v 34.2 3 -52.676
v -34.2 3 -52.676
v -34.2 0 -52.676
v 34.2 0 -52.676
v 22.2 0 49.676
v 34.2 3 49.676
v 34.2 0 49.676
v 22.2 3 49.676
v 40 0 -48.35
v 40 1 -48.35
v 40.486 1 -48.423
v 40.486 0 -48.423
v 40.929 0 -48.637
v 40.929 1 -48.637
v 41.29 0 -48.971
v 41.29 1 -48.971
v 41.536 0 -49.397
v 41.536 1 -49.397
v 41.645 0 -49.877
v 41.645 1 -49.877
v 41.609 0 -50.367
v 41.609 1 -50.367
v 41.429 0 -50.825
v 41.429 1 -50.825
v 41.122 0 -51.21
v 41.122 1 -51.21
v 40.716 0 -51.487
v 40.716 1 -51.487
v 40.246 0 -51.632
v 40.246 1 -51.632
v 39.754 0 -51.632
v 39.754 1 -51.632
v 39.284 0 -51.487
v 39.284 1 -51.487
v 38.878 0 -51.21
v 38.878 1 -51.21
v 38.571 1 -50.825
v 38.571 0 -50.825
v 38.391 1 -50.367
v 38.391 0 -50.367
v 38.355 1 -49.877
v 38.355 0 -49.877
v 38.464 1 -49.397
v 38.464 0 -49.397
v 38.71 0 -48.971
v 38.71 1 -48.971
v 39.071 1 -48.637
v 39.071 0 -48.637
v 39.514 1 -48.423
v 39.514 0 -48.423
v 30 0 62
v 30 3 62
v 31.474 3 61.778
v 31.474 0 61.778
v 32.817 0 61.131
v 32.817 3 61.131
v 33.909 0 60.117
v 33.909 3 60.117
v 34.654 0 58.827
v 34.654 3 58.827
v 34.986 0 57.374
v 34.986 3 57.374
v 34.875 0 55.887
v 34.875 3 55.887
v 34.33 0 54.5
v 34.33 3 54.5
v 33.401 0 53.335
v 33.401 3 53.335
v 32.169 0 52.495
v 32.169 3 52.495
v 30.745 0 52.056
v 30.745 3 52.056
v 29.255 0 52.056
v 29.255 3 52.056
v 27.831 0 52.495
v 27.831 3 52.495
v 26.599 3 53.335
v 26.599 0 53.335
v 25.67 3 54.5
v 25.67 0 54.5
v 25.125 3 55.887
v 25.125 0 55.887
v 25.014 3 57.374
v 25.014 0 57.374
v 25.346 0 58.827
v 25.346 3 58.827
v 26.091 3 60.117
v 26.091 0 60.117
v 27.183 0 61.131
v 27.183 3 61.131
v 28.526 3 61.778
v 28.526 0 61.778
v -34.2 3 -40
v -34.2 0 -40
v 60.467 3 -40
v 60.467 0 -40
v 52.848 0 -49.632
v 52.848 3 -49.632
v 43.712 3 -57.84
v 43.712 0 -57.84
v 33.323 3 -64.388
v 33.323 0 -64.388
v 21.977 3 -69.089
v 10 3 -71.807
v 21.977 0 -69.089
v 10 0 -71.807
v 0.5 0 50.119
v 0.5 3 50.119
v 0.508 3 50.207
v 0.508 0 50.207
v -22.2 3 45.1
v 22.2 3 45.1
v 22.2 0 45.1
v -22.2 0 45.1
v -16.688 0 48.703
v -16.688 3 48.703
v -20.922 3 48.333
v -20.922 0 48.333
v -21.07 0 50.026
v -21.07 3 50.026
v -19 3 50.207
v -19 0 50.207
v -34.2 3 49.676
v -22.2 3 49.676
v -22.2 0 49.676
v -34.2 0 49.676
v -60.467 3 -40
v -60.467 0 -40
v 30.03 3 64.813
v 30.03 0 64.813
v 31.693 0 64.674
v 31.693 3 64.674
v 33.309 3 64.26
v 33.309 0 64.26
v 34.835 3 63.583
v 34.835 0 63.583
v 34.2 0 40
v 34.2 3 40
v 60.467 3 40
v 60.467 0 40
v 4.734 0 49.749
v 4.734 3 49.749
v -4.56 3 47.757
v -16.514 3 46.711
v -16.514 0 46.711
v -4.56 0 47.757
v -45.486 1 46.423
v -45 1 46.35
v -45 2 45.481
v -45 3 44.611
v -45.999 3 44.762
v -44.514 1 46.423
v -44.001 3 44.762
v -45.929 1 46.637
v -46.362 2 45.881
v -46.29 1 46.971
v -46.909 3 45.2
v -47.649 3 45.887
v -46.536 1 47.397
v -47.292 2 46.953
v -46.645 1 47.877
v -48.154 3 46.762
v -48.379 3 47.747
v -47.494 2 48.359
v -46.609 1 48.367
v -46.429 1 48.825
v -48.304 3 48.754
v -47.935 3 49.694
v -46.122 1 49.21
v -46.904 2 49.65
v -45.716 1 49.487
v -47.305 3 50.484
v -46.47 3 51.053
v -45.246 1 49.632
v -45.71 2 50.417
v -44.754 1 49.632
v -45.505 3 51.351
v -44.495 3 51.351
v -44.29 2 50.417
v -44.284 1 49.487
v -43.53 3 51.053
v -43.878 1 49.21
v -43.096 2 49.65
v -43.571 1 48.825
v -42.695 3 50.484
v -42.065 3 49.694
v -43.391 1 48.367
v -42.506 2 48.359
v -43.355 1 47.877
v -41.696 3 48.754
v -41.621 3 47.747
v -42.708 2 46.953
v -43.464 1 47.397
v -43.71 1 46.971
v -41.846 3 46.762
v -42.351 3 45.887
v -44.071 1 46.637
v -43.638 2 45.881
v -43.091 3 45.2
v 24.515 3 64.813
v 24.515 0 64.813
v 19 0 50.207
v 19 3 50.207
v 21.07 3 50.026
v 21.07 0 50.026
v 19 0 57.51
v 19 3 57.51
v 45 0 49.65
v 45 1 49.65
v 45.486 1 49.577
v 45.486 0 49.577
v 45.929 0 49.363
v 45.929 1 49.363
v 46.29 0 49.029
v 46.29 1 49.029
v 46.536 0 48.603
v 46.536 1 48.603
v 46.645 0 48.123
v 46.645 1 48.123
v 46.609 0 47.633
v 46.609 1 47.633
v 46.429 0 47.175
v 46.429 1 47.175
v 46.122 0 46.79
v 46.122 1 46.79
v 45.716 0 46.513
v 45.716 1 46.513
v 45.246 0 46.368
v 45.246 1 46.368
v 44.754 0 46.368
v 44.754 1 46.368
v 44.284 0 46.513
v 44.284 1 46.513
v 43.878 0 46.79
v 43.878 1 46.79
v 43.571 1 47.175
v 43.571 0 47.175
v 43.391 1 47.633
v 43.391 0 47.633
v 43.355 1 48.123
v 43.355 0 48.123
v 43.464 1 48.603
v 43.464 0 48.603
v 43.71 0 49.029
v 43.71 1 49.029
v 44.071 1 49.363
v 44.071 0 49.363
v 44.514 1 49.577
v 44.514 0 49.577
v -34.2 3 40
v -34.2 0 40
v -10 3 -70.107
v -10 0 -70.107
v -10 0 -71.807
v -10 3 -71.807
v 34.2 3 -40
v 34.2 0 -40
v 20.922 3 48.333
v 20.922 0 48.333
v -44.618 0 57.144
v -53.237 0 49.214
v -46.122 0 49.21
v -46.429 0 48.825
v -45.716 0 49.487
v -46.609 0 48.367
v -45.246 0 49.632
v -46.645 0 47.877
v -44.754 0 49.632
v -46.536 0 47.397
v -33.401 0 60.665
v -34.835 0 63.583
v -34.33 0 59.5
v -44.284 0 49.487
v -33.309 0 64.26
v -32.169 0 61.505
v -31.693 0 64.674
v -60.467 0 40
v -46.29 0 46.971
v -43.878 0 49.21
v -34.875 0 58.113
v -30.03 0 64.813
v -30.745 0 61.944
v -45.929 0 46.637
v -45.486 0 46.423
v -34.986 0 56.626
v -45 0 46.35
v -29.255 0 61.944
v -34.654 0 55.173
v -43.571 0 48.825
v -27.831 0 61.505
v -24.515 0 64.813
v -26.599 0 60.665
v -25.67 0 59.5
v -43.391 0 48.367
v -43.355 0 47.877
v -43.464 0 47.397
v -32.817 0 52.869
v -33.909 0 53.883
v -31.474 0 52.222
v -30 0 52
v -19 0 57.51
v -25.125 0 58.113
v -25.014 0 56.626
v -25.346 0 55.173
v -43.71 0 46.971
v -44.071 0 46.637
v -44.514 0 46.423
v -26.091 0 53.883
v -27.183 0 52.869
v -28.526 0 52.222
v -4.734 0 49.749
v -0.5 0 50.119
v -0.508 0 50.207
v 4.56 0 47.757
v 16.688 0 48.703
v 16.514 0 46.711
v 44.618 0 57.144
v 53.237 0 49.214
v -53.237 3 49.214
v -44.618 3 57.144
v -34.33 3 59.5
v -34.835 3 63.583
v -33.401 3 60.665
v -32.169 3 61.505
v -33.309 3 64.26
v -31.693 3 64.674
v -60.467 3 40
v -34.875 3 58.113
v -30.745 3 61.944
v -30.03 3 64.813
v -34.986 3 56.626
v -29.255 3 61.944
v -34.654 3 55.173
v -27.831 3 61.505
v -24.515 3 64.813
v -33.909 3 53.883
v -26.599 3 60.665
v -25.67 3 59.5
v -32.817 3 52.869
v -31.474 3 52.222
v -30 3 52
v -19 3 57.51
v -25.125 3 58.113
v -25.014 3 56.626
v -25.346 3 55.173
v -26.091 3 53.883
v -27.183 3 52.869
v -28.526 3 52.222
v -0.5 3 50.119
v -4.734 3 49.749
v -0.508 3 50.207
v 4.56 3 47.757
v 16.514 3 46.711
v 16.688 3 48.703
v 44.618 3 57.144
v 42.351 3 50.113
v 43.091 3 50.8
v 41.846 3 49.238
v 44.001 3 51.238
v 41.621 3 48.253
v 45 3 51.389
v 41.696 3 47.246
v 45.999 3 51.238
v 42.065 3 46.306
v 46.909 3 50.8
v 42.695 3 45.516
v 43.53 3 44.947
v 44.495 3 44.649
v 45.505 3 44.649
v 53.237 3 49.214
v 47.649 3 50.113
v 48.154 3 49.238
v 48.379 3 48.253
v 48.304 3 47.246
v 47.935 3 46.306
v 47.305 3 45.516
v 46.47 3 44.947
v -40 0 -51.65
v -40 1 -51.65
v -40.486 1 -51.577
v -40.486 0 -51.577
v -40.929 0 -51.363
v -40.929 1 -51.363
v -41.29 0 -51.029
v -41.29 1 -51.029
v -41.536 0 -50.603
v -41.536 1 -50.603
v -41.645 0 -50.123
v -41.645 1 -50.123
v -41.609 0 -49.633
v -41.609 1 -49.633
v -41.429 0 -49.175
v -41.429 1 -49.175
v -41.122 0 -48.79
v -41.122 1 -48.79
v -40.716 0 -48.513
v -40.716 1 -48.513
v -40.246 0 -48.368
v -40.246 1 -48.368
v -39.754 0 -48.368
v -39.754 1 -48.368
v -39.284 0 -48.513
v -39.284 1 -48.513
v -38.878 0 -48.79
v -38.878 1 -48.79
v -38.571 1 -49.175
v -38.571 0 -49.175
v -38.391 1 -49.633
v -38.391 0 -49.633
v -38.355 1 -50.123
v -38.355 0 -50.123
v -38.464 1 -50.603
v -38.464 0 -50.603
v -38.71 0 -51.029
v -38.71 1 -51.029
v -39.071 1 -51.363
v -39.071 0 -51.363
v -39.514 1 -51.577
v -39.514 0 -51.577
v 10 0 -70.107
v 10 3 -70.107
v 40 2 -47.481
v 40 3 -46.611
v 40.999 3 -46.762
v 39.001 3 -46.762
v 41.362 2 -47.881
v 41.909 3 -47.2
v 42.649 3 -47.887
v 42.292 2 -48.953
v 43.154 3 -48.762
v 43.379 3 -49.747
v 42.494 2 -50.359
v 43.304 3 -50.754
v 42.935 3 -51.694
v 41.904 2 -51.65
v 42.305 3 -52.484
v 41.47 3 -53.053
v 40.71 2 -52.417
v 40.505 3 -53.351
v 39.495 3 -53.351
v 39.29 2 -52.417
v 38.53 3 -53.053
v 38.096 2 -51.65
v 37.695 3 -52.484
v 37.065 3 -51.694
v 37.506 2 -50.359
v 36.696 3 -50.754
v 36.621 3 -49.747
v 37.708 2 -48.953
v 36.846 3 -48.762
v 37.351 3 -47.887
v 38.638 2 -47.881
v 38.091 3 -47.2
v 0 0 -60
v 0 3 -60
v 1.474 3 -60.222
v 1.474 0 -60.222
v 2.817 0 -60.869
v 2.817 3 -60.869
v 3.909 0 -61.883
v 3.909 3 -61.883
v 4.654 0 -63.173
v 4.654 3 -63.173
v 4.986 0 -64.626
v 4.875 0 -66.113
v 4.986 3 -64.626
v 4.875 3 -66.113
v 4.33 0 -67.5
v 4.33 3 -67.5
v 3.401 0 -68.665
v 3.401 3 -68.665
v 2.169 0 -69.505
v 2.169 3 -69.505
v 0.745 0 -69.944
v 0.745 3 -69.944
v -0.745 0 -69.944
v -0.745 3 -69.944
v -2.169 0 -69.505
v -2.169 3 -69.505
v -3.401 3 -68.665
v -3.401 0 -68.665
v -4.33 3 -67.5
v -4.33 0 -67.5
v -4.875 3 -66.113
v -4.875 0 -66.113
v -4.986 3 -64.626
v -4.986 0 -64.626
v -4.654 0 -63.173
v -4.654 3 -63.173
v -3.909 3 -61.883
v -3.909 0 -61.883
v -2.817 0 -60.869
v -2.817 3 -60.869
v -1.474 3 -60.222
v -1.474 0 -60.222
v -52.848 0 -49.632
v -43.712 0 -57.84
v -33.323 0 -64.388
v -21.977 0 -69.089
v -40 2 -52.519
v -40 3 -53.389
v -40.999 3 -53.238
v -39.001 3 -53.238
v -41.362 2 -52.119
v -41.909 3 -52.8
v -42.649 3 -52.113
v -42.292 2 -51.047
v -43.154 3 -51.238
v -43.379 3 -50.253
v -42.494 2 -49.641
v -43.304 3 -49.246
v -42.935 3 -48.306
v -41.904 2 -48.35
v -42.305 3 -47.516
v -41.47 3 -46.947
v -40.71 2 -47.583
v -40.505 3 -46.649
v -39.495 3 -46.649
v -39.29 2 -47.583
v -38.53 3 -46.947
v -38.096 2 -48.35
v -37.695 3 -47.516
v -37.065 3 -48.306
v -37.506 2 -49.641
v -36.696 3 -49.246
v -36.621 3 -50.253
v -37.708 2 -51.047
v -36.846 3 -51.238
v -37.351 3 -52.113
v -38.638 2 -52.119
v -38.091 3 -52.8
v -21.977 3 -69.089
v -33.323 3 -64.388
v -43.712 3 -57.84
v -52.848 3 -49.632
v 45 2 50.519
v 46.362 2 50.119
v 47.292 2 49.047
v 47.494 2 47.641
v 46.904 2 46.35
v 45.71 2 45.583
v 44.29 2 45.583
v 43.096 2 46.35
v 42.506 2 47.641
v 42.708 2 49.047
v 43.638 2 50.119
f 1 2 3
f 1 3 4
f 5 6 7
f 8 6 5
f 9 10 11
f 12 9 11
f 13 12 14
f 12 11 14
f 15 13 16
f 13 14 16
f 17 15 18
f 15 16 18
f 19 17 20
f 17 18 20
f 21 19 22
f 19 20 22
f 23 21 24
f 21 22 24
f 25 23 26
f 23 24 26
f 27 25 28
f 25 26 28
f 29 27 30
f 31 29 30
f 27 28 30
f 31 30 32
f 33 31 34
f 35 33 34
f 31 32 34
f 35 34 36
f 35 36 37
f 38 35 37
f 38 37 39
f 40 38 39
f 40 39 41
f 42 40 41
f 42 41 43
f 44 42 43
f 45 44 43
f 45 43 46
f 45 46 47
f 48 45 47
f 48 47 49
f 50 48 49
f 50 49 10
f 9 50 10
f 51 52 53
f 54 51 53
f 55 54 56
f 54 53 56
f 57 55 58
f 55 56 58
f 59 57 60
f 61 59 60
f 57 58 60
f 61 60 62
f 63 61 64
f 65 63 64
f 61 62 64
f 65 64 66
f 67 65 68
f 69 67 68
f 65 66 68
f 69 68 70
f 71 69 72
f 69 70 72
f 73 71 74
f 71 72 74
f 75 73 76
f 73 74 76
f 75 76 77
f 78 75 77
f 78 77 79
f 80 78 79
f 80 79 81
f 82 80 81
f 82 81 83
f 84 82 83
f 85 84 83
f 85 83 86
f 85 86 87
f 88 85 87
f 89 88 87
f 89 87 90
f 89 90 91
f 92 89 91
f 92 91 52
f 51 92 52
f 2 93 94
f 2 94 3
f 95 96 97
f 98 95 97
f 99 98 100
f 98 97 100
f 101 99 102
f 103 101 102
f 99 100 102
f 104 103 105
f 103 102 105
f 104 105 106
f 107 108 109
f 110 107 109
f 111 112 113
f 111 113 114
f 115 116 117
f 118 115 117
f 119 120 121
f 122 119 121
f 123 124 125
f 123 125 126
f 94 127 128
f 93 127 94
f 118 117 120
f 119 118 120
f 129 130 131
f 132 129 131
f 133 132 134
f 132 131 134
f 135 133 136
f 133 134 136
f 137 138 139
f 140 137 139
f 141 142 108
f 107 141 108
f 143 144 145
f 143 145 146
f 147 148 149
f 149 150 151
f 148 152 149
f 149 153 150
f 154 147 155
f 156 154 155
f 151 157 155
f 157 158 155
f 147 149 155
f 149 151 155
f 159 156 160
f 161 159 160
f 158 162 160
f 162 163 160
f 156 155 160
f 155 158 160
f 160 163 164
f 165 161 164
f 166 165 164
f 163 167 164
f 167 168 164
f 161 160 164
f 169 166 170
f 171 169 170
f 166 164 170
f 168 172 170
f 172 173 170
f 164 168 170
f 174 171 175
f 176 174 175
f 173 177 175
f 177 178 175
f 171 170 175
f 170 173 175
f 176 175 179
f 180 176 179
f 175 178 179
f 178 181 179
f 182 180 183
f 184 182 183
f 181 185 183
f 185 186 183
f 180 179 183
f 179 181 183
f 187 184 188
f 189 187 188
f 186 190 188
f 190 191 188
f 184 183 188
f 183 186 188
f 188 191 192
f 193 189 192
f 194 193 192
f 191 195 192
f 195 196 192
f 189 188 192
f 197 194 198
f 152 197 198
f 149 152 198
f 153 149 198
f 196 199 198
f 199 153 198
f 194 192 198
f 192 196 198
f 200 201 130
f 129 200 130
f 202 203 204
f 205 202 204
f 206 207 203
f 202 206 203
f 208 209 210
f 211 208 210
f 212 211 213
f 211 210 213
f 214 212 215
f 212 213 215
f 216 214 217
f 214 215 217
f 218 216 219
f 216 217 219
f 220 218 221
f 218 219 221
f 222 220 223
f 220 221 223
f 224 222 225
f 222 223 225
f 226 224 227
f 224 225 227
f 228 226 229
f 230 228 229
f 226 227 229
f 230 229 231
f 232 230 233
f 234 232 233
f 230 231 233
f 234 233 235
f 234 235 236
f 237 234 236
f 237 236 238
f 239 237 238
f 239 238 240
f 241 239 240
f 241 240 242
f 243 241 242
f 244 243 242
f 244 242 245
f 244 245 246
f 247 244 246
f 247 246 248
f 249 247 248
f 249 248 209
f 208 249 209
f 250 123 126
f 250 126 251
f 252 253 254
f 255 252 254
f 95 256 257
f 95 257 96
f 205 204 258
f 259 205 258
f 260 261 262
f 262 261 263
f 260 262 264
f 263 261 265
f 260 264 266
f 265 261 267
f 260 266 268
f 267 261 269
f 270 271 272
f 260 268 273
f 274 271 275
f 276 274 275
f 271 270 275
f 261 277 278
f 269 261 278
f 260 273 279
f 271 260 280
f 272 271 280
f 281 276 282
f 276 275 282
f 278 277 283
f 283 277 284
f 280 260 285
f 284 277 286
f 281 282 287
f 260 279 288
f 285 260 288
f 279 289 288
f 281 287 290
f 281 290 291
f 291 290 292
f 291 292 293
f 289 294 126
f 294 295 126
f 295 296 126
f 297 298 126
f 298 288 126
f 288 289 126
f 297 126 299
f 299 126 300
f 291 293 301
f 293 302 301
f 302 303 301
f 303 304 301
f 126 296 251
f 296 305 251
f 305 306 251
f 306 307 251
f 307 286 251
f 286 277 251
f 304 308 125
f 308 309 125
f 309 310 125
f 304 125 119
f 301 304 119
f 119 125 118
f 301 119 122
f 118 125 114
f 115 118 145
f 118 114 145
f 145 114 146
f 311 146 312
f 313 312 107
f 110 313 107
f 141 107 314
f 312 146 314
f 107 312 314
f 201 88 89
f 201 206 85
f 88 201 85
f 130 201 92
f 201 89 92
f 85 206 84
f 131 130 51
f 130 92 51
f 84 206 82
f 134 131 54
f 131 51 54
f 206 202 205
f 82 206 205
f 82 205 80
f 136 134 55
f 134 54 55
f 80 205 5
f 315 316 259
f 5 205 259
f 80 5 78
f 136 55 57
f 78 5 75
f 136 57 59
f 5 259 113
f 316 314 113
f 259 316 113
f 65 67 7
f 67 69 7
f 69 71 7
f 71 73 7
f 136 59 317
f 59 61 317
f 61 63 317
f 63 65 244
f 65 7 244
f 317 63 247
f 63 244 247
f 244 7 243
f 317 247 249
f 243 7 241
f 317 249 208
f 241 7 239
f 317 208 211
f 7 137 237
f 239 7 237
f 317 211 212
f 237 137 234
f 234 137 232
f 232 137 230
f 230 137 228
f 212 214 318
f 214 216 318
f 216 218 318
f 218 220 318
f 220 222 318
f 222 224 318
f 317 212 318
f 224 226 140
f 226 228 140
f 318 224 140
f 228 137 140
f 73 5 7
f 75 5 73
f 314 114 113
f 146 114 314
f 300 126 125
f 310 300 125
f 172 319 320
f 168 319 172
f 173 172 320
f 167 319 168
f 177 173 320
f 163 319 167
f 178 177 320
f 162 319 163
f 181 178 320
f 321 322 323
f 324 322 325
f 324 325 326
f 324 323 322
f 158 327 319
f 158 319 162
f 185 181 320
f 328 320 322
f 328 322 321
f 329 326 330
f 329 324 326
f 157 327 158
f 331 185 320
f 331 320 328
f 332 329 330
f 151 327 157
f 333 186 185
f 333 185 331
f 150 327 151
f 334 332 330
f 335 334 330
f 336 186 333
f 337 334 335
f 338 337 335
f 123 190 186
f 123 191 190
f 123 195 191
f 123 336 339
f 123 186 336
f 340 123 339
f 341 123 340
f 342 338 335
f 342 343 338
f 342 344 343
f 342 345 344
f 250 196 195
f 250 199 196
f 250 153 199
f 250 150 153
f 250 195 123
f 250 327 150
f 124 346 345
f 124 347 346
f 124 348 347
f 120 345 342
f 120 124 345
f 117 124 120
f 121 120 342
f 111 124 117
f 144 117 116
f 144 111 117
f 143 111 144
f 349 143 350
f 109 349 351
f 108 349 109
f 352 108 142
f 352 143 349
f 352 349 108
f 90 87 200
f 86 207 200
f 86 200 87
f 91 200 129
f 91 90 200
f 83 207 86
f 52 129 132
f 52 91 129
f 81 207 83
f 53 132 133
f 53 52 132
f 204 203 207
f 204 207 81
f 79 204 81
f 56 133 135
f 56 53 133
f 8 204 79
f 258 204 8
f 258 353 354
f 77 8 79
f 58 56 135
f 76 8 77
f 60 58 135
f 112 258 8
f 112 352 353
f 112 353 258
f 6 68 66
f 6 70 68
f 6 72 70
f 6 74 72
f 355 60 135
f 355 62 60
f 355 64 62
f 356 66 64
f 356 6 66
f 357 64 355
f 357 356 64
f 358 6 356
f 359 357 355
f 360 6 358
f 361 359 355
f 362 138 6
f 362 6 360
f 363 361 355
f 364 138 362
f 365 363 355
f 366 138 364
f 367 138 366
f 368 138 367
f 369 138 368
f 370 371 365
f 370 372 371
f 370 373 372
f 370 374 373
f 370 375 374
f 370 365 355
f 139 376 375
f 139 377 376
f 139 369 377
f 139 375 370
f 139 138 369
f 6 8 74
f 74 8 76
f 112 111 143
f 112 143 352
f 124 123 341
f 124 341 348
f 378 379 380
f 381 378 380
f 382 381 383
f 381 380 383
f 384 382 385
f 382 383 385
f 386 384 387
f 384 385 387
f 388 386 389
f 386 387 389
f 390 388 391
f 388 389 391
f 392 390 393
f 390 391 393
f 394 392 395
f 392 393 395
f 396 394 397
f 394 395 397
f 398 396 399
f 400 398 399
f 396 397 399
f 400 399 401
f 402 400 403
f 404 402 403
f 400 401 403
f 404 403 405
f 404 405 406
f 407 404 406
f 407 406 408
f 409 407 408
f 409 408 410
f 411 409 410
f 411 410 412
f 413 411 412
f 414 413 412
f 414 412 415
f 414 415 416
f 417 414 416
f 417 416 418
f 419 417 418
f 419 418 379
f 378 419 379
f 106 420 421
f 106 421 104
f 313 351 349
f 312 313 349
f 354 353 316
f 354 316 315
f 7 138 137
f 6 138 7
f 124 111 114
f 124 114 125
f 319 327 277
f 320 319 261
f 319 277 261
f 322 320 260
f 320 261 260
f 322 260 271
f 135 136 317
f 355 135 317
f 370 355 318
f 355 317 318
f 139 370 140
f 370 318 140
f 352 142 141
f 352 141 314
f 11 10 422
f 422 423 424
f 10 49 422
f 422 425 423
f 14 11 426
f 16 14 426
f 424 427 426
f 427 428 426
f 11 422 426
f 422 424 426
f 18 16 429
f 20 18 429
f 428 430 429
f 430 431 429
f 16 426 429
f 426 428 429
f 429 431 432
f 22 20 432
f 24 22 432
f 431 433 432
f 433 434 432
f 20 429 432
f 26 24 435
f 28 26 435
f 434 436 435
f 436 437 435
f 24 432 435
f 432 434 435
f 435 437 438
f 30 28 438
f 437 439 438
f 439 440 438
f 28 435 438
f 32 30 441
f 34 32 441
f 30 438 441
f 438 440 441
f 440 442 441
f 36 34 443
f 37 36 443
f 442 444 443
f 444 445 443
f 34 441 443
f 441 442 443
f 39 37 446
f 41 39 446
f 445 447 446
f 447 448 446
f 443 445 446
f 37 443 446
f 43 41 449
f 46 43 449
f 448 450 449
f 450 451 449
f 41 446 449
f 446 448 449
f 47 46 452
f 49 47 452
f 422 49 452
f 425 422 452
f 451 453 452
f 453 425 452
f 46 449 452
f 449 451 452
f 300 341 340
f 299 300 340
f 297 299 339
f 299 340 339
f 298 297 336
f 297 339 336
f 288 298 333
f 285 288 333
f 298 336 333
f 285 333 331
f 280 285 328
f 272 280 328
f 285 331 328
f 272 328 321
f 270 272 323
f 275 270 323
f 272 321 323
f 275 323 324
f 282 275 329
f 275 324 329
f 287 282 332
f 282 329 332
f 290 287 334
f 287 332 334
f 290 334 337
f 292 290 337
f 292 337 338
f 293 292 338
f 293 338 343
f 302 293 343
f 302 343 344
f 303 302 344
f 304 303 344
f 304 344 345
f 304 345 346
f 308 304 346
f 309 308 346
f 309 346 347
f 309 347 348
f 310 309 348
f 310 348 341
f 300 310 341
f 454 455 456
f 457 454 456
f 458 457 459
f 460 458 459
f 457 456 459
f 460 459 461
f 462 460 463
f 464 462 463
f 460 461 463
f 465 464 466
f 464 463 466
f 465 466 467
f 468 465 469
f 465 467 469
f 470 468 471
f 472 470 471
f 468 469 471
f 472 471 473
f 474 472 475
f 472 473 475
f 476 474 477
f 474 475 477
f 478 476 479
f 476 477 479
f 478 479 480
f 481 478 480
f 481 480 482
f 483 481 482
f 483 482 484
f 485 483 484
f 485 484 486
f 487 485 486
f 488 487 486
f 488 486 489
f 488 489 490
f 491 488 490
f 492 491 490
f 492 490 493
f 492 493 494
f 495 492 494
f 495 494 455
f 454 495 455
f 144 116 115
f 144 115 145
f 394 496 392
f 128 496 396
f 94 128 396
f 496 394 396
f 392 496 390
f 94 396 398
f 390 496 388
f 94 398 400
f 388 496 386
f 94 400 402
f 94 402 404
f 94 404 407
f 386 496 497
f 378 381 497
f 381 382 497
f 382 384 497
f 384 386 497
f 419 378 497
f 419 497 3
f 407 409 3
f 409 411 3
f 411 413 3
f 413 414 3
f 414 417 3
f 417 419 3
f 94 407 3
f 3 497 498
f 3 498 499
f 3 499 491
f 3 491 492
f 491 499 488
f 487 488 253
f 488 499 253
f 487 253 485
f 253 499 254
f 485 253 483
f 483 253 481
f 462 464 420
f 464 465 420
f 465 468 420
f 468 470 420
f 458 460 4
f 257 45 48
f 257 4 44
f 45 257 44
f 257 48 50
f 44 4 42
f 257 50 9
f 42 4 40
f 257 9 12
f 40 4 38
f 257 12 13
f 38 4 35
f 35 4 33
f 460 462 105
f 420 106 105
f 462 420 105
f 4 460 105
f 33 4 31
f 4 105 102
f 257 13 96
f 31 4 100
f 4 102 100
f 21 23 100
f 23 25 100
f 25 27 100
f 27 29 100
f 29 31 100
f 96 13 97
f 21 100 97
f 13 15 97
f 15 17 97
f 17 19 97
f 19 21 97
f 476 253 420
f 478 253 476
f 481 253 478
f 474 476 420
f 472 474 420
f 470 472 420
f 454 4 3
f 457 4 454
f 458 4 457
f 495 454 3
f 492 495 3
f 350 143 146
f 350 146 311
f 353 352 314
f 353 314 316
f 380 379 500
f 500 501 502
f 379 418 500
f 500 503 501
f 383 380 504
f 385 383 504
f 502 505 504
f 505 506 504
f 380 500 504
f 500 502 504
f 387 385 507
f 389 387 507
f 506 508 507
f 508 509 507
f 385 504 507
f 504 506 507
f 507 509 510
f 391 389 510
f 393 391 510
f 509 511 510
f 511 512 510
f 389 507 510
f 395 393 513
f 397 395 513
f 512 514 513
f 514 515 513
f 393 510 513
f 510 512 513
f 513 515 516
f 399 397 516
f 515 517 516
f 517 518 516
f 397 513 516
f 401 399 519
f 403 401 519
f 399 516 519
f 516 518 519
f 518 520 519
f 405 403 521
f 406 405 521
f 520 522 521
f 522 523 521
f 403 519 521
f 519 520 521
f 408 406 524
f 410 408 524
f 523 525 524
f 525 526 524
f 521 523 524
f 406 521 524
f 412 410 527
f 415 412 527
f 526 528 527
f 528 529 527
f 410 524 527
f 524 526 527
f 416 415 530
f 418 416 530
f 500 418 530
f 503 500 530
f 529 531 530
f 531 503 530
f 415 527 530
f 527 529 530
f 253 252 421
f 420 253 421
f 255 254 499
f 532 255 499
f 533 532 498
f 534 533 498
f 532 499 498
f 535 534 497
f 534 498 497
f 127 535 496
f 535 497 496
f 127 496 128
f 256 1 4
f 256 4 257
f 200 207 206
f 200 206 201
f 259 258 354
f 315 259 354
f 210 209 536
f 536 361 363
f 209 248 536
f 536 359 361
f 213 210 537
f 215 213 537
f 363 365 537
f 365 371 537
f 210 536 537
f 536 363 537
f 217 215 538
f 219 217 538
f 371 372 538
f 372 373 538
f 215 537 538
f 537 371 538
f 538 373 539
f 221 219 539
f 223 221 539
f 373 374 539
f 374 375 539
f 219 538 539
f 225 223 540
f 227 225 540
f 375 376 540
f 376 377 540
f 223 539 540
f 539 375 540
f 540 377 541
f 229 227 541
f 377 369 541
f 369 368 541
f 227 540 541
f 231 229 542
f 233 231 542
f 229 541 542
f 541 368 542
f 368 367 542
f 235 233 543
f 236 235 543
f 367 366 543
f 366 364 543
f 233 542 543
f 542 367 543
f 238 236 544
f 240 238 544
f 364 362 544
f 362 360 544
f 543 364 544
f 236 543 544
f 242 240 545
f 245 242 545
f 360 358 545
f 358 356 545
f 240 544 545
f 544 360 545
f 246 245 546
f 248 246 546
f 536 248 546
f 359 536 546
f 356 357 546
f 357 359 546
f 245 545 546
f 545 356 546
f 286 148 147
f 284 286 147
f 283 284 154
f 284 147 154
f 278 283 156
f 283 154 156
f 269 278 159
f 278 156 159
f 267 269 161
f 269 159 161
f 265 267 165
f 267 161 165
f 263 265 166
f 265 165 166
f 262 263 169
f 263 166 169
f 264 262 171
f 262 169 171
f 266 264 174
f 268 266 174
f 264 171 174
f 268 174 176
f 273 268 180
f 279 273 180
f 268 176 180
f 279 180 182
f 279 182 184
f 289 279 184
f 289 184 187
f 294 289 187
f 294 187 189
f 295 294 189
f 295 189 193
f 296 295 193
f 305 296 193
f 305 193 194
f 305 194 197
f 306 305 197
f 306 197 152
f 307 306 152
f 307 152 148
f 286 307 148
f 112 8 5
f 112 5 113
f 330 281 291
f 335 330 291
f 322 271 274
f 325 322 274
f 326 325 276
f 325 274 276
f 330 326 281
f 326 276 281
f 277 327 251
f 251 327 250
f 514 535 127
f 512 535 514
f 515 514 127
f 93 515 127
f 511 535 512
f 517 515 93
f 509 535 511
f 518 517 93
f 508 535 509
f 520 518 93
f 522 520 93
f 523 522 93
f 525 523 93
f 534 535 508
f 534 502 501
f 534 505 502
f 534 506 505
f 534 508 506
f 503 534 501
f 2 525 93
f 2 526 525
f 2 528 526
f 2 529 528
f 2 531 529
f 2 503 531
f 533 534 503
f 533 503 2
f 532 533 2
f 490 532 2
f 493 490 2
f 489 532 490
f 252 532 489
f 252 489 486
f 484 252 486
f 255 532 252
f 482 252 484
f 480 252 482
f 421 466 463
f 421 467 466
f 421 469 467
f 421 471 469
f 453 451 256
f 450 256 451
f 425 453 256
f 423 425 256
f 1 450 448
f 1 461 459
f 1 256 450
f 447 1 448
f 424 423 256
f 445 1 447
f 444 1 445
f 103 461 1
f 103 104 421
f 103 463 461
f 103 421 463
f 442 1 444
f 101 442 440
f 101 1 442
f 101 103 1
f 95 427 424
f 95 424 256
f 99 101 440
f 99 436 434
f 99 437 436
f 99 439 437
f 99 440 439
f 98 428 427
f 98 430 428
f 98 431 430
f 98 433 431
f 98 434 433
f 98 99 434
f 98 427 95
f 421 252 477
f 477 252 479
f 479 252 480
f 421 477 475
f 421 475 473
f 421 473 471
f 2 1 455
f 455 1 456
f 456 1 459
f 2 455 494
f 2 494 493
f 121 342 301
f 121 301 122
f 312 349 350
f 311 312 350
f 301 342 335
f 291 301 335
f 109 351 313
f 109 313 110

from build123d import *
from OCP.BRepFilletAPI import BRepFilletAPI_MakeChamfer

# Parameters (mm, degrees)
BOSS_EXTRUDE1_DEPTH = 3
CUT_EXTRUDE1_DEPTH  = 103.574363269
SKETCH3_W           = 38.3
SKETCH3_H           = 80
CUT_EXTRUDE2_DEPTH  = 103.574363269
CUT_EXTRUDE3_DEPTH  = 95.453692358
SKETCH5_W           = 38
SKETCH5_H           = 14.605577538
CUT_EXTRUDE4_DEPTH  = 95.453692358
SKETCH6_W           = 68.4
SKETCH6_H           = 3
CUT_EXTRUDE5_DEPTH  = 95.453692358
SKETCH7_R           = 5
CUT_EXTRUDE6_DEPTH  = 95.453692358
SKETCH11_R          = 5
CUT_EXTRUDE10_DEPTH = 95.453692358
CUT_EXTRUDE11_DEPTH = 95.453692358
SKETCH14_R          = 1.65
CUT_EXTRUDE12_DEPTH = 95.453692358
SKETCH15_W          = 20
SKETCH15_H          = 1.7
CUT_EXTRUDE13_DEPTH = 10
CHAMFER1_SIZE       = 2
CHAMFER1_SIZE2      = 1.738573476
CHAMFER2_SIZE       = 2
CHAMFER2_SIZE2      = 1.738573476


with BuildPart() as part:
    # Sketch1 → Boss-Extrude1 (new body)
    with BuildSketch(Plane(origin=(0, 0, 0), x_dir=(1, 0, 0), z_dir=(0, 1, 0))):
        with BuildLine():
            Line((-30.029977361, -64.812867647), (30.029977361, -64.812867647))
            ThreePointArc((30.029977361, -64.812867647), (32.509837414, -64.500503794), (34.834773739, -63.582926471))
            ThreePointArc((34.834773739, -63.582926471), (0, 72.5), (-34.834773739, -63.582926471))
            ThreePointArc((-34.834773739, -63.582926471), (-32.509837414, -64.500503794), (-30.029977361, -64.812867647))
        make_face()
    extrude(amount=BOSS_EXTRUDE1_DEPTH)

    # Sketch2 → Cut-Extrude1 (cut, through all)
    with BuildSketch(Plane(origin=(0, 3, 0), x_dir=(1, 0, 0), z_dir=(0, 1, 0))):
        Polygon((22.2, -49.675685802), (22.2, -45.1), (-22.2, -45.1), (-22.2, -49.675685802), (-34.2, -49.675685802), (-34.2, 49.675685802), (-22.2, 49.675685802), (-22.2, 45.5), (22.2, 45.5), (22.2, 49.675685802), (34.2, 49.675685802), (34.2, -49.675685802), align=None)
    extrude(amount=-CUT_EXTRUDE1_DEPTH, mode=Mode.SUBTRACT)

    # Sketch3 → Cut-Extrude2 (cut, through all)
    with BuildSketch(Plane(origin=(0, 3, 0), x_dir=(1, 0, 0), z_dir=(0, 1, 0))):
        with Locations((-53.35, 0)):
            Rectangle(SKETCH3_W, SKETCH3_H)
        with Locations((53.35, 0)):
            Rectangle(SKETCH3_W, SKETCH3_H)
    extrude(amount=-CUT_EXTRUDE2_DEPTH, mode=Mode.SUBTRACT)


with BuildPart() as cut_extrude2_piece_1:
    # of the separate pieces the step leaves, piece 1, a body of its own (cut_extrude2_pieces)
    add(part.part.solids().sort_by_distance((60.466933112, 0, -40))[0])

    # Sketch6 → Cut-Extrude5 (cut, through all)
    with BuildSketch(Plane(origin=(0, 3, 0), x_dir=(1, 0, 0), z_dir=(0, 1, 0))):
        with Locations((0, 51.175685802)):
            Rectangle(SKETCH6_W, SKETCH6_H)
    extrude(amount=-CUT_EXTRUDE5_DEPTH, mode=Mode.SUBTRACT)


with BuildPart() as cut_extrude2_piece_2:
    # of the separate pieces the step leaves, piece 2, a body of its own (cut_extrude2_pieces)
    add(part.part.solids().sort_by_distance((-34.834773739, 0, 63.582926471))[0])

    # Sketch4 → Cut-Extrude3 (cut, through all)
    with BuildSketch(Plane(origin=(0, 3, 0), x_dir=(1, 0, 0), z_dir=(0, 1, 0))):
        Polygon((-21.070156074, -50.026174921), (-0.648164763, -51.812867647), (-0.5, -50.11933666), (-20.921991311, -48.332643934), align=None)
        Polygon((21.070156074, -50.026174921), (20.921991311, -48.332643934), (0.5, -50.11933666), (0.648164763, -51.812867647), align=None)
    extrude(amount=-CUT_EXTRUDE3_DEPTH, mode=Mode.SUBTRACT)

    # Sketch5 → Cut-Extrude4 (cut, through all)
    with BuildSketch(Plane(origin=(0, 3, 0), x_dir=(1, 0, 0), z_dir=(0, 1, 0))):
        with Locations((0, -57.510078878)):
            Rectangle(SKETCH5_W, SKETCH5_H)
        Polygon((16.688163844, -48.703055841), (4.733827467, -49.748924754), (4.559515981, -47.756535357), (16.513852358, -46.710666444), align=None)
        Polygon((-16.513852358, -46.710666444), (-4.559515981, -47.756535357), (-4.733827467, -49.748924754), (-16.688163844, -48.703055841), align=None)
    extrude(amount=-CUT_EXTRUDE4_DEPTH, mode=Mode.SUBTRACT)

    # Sketch7 → Cut-Extrude6 (cut, through all)
    with BuildSketch(Plane(origin=(0, 3, 0), x_dir=(1, 0, 0), z_dir=(0, 1, 0))):
        with Locations(Location((-30, -57, 0), (0, 0, 90))):
            Circle(SKETCH7_R)
        with Locations(Location((30, -57, 0), (0, 0, 270))):
            Circle(SKETCH7_R)
    extrude(amount=-CUT_EXTRUDE6_DEPTH, mode=Mode.SUBTRACT)

    # Sketch13 → Cut-Extrude11 (cut, through all)
    with BuildSketch(Plane(origin=(0, 3, 0), x_dir=(1, 0, 0), z_dir=(0, 1, 0))):
        Polygon((19, -57.510078878), (24.514988681, -64.812867647), (19, -64.812867647), align=None)
        Polygon((-19, -64.812867647), (-19, -57.510078878), (-24.514988681, -64.812867647), align=None)
    extrude(amount=-CUT_EXTRUDE11_DEPTH, mode=Mode.SUBTRACT)


with BuildPart() as cut_extrude5_kept_piece:
    # of the separate pieces the step leaves, the one the design keeps (cut_extrude5_pieces_kept)
    add(cut_extrude2_piece_1.part.solids().sort_by_distance((60.466933112, 0, -40))[0])

    # Sketch11 → Cut-Extrude10 (cut, through all)
    with BuildSketch(Plane(origin=(0, 3, 0), x_dir=(1, 0, 0), z_dir=(0, 1, 0))):
        with Locations(Location((0, 65, 0), (0, 0, 270))):
            Circle(SKETCH11_R)
    extrude(amount=-CUT_EXTRUDE10_DEPTH, mode=Mode.SUBTRACT)


with BuildPart() as cut_extrude12_tool:
    # Sketch14 → Cut-Extrude12 (new, through all)
    with BuildSketch(Plane(origin=(0, 3, 0), x_dir=(1, 0, 0), z_dir=(0, 1, 0))):
        with Locations(Location((45, -48, 0), (0, 0, 270))):
            Circle(SKETCH14_R)
        with Locations(Location((-45, -48, 0), (0, 0, 90))):
            Circle(SKETCH14_R)
        with Locations(Location((40, 50, 0), (0, 0, 270))):
            Circle(SKETCH14_R)
        with Locations(Location((-40, 50, 0), (0, 0, 90))):
            Circle(SKETCH14_R)
    extrude(amount=-CUT_EXTRUDE12_DEPTH)


with BuildPart() as cut_extrude2_piece_2_1:
    add(cut_extrude2_piece_2.part)

    # Cut-Extrude12: cut by cut_extrude12_tool
    add(cut_extrude12_tool.part, mode=Mode.SUBTRACT)

    # Chamfer1: one chamfer whose edges measure the first distance from different faces: ONE call of the kernel's chamfer builder (chamfer() names one face for all edges)
    chamfer1_edges_1 = [cut_extrude2_piece_2_1.edges().sort_by_distance(p)[0] for p in [
        (45, 3, 46.35),
    ]]
    chamfer1_side_1 = [cut_extrude2_piece_2_1.faces().sort_by_distance(p)[0] for p in [
        (45, 1.5, 46.35),
    ]]
    chamfer1_edges_2 = [cut_extrude2_piece_2_1.edges().sort_by_distance(p)[0] for p in [
        (-45, 3, 49.65),
    ]]
    chamfer1_side_2 = [cut_extrude2_piece_2_1.faces().sort_by_distance(p)[0] for p in [
        (-45, 1.5, 49.65),
    ]]
    chamfer1 = BRepFilletAPI_MakeChamfer(cut_extrude2_piece_2_1.part.solid().wrapped)
    for e in chamfer1_edges_1:
        chamfer1.Add(CHAMFER1_SIZE, CHAMFER1_SIZE2, e.wrapped, chamfer1_side_1[0].wrapped)  # the first distance lies on this face
    for e in chamfer1_edges_2:
        chamfer1.Add(CHAMFER1_SIZE, CHAMFER1_SIZE2, e.wrapped, chamfer1_side_2[0].wrapped)  # the first distance lies on this face
    add(Compound.cast(chamfer1.Shape()), mode=Mode.REPLACE)


with BuildPart() as cut_extrude5_kept_piece_1:
    add(cut_extrude5_kept_piece.part)

    # Cut-Extrude12: cut by cut_extrude12_tool
    add(cut_extrude12_tool.part, mode=Mode.SUBTRACT)

    # Sketch15 → Cut-Extrude13 (cut)
    with BuildSketch(Plane(origin=(0, 3, 0), x_dir=(1, 0, 0), z_dir=(0, 1, 0))):
        with Locations((0, 70.957033082)):
            Rectangle(SKETCH15_W, SKETCH15_H)
    extrude(amount=-CUT_EXTRUDE13_DEPTH, mode=Mode.SUBTRACT)


with BuildPart() as body_3:
    # of the pieces the cut leaves, the one that is kept (cut_extrude13_keep)
    add(cut_extrude5_kept_piece_1.part.solids().sort_by_distance((60.466933112, 0, -40))[0])

    # Chamfer2: one chamfer whose edges measure the first distance from different faces: ONE call of the kernel's chamfer builder (chamfer() names one face for all edges)
    chamfer2_edges_1 = [body_3.edges().sort_by_distance(p)[0] for p in [
        (-40, 3, -48.35),
    ]]
    chamfer2_side_1 = [body_3.faces().sort_by_distance(p)[0] for p in [
        (-40, 1.5, -48.35),
    ]]
    chamfer2_edges_2 = [body_3.edges().sort_by_distance(p)[0] for p in [
        (40, 3, -51.65),
    ]]
    chamfer2_side_2 = [body_3.faces().sort_by_distance(p)[0] for p in [
        (40, 1.5, -51.65),
    ]]
    chamfer2 = BRepFilletAPI_MakeChamfer(body_3.part.solid().wrapped)
    for e in chamfer2_edges_1:
        chamfer2.Add(CHAMFER2_SIZE, CHAMFER2_SIZE2, e.wrapped, chamfer2_side_1[0].wrapped)  # the first distance lies on this face
    for e in chamfer2_edges_2:
        chamfer2.Add(CHAMFER2_SIZE, CHAMFER2_SIZE2, e.wrapped, chamfer2_side_2[0].wrapped)  # the first distance lies on this face
    add(Compound.cast(chamfer2.Shape()), mode=Mode.REPLACE)


solid = Compound([cut_extrude2_piece_2_1.part, body_3.part])
